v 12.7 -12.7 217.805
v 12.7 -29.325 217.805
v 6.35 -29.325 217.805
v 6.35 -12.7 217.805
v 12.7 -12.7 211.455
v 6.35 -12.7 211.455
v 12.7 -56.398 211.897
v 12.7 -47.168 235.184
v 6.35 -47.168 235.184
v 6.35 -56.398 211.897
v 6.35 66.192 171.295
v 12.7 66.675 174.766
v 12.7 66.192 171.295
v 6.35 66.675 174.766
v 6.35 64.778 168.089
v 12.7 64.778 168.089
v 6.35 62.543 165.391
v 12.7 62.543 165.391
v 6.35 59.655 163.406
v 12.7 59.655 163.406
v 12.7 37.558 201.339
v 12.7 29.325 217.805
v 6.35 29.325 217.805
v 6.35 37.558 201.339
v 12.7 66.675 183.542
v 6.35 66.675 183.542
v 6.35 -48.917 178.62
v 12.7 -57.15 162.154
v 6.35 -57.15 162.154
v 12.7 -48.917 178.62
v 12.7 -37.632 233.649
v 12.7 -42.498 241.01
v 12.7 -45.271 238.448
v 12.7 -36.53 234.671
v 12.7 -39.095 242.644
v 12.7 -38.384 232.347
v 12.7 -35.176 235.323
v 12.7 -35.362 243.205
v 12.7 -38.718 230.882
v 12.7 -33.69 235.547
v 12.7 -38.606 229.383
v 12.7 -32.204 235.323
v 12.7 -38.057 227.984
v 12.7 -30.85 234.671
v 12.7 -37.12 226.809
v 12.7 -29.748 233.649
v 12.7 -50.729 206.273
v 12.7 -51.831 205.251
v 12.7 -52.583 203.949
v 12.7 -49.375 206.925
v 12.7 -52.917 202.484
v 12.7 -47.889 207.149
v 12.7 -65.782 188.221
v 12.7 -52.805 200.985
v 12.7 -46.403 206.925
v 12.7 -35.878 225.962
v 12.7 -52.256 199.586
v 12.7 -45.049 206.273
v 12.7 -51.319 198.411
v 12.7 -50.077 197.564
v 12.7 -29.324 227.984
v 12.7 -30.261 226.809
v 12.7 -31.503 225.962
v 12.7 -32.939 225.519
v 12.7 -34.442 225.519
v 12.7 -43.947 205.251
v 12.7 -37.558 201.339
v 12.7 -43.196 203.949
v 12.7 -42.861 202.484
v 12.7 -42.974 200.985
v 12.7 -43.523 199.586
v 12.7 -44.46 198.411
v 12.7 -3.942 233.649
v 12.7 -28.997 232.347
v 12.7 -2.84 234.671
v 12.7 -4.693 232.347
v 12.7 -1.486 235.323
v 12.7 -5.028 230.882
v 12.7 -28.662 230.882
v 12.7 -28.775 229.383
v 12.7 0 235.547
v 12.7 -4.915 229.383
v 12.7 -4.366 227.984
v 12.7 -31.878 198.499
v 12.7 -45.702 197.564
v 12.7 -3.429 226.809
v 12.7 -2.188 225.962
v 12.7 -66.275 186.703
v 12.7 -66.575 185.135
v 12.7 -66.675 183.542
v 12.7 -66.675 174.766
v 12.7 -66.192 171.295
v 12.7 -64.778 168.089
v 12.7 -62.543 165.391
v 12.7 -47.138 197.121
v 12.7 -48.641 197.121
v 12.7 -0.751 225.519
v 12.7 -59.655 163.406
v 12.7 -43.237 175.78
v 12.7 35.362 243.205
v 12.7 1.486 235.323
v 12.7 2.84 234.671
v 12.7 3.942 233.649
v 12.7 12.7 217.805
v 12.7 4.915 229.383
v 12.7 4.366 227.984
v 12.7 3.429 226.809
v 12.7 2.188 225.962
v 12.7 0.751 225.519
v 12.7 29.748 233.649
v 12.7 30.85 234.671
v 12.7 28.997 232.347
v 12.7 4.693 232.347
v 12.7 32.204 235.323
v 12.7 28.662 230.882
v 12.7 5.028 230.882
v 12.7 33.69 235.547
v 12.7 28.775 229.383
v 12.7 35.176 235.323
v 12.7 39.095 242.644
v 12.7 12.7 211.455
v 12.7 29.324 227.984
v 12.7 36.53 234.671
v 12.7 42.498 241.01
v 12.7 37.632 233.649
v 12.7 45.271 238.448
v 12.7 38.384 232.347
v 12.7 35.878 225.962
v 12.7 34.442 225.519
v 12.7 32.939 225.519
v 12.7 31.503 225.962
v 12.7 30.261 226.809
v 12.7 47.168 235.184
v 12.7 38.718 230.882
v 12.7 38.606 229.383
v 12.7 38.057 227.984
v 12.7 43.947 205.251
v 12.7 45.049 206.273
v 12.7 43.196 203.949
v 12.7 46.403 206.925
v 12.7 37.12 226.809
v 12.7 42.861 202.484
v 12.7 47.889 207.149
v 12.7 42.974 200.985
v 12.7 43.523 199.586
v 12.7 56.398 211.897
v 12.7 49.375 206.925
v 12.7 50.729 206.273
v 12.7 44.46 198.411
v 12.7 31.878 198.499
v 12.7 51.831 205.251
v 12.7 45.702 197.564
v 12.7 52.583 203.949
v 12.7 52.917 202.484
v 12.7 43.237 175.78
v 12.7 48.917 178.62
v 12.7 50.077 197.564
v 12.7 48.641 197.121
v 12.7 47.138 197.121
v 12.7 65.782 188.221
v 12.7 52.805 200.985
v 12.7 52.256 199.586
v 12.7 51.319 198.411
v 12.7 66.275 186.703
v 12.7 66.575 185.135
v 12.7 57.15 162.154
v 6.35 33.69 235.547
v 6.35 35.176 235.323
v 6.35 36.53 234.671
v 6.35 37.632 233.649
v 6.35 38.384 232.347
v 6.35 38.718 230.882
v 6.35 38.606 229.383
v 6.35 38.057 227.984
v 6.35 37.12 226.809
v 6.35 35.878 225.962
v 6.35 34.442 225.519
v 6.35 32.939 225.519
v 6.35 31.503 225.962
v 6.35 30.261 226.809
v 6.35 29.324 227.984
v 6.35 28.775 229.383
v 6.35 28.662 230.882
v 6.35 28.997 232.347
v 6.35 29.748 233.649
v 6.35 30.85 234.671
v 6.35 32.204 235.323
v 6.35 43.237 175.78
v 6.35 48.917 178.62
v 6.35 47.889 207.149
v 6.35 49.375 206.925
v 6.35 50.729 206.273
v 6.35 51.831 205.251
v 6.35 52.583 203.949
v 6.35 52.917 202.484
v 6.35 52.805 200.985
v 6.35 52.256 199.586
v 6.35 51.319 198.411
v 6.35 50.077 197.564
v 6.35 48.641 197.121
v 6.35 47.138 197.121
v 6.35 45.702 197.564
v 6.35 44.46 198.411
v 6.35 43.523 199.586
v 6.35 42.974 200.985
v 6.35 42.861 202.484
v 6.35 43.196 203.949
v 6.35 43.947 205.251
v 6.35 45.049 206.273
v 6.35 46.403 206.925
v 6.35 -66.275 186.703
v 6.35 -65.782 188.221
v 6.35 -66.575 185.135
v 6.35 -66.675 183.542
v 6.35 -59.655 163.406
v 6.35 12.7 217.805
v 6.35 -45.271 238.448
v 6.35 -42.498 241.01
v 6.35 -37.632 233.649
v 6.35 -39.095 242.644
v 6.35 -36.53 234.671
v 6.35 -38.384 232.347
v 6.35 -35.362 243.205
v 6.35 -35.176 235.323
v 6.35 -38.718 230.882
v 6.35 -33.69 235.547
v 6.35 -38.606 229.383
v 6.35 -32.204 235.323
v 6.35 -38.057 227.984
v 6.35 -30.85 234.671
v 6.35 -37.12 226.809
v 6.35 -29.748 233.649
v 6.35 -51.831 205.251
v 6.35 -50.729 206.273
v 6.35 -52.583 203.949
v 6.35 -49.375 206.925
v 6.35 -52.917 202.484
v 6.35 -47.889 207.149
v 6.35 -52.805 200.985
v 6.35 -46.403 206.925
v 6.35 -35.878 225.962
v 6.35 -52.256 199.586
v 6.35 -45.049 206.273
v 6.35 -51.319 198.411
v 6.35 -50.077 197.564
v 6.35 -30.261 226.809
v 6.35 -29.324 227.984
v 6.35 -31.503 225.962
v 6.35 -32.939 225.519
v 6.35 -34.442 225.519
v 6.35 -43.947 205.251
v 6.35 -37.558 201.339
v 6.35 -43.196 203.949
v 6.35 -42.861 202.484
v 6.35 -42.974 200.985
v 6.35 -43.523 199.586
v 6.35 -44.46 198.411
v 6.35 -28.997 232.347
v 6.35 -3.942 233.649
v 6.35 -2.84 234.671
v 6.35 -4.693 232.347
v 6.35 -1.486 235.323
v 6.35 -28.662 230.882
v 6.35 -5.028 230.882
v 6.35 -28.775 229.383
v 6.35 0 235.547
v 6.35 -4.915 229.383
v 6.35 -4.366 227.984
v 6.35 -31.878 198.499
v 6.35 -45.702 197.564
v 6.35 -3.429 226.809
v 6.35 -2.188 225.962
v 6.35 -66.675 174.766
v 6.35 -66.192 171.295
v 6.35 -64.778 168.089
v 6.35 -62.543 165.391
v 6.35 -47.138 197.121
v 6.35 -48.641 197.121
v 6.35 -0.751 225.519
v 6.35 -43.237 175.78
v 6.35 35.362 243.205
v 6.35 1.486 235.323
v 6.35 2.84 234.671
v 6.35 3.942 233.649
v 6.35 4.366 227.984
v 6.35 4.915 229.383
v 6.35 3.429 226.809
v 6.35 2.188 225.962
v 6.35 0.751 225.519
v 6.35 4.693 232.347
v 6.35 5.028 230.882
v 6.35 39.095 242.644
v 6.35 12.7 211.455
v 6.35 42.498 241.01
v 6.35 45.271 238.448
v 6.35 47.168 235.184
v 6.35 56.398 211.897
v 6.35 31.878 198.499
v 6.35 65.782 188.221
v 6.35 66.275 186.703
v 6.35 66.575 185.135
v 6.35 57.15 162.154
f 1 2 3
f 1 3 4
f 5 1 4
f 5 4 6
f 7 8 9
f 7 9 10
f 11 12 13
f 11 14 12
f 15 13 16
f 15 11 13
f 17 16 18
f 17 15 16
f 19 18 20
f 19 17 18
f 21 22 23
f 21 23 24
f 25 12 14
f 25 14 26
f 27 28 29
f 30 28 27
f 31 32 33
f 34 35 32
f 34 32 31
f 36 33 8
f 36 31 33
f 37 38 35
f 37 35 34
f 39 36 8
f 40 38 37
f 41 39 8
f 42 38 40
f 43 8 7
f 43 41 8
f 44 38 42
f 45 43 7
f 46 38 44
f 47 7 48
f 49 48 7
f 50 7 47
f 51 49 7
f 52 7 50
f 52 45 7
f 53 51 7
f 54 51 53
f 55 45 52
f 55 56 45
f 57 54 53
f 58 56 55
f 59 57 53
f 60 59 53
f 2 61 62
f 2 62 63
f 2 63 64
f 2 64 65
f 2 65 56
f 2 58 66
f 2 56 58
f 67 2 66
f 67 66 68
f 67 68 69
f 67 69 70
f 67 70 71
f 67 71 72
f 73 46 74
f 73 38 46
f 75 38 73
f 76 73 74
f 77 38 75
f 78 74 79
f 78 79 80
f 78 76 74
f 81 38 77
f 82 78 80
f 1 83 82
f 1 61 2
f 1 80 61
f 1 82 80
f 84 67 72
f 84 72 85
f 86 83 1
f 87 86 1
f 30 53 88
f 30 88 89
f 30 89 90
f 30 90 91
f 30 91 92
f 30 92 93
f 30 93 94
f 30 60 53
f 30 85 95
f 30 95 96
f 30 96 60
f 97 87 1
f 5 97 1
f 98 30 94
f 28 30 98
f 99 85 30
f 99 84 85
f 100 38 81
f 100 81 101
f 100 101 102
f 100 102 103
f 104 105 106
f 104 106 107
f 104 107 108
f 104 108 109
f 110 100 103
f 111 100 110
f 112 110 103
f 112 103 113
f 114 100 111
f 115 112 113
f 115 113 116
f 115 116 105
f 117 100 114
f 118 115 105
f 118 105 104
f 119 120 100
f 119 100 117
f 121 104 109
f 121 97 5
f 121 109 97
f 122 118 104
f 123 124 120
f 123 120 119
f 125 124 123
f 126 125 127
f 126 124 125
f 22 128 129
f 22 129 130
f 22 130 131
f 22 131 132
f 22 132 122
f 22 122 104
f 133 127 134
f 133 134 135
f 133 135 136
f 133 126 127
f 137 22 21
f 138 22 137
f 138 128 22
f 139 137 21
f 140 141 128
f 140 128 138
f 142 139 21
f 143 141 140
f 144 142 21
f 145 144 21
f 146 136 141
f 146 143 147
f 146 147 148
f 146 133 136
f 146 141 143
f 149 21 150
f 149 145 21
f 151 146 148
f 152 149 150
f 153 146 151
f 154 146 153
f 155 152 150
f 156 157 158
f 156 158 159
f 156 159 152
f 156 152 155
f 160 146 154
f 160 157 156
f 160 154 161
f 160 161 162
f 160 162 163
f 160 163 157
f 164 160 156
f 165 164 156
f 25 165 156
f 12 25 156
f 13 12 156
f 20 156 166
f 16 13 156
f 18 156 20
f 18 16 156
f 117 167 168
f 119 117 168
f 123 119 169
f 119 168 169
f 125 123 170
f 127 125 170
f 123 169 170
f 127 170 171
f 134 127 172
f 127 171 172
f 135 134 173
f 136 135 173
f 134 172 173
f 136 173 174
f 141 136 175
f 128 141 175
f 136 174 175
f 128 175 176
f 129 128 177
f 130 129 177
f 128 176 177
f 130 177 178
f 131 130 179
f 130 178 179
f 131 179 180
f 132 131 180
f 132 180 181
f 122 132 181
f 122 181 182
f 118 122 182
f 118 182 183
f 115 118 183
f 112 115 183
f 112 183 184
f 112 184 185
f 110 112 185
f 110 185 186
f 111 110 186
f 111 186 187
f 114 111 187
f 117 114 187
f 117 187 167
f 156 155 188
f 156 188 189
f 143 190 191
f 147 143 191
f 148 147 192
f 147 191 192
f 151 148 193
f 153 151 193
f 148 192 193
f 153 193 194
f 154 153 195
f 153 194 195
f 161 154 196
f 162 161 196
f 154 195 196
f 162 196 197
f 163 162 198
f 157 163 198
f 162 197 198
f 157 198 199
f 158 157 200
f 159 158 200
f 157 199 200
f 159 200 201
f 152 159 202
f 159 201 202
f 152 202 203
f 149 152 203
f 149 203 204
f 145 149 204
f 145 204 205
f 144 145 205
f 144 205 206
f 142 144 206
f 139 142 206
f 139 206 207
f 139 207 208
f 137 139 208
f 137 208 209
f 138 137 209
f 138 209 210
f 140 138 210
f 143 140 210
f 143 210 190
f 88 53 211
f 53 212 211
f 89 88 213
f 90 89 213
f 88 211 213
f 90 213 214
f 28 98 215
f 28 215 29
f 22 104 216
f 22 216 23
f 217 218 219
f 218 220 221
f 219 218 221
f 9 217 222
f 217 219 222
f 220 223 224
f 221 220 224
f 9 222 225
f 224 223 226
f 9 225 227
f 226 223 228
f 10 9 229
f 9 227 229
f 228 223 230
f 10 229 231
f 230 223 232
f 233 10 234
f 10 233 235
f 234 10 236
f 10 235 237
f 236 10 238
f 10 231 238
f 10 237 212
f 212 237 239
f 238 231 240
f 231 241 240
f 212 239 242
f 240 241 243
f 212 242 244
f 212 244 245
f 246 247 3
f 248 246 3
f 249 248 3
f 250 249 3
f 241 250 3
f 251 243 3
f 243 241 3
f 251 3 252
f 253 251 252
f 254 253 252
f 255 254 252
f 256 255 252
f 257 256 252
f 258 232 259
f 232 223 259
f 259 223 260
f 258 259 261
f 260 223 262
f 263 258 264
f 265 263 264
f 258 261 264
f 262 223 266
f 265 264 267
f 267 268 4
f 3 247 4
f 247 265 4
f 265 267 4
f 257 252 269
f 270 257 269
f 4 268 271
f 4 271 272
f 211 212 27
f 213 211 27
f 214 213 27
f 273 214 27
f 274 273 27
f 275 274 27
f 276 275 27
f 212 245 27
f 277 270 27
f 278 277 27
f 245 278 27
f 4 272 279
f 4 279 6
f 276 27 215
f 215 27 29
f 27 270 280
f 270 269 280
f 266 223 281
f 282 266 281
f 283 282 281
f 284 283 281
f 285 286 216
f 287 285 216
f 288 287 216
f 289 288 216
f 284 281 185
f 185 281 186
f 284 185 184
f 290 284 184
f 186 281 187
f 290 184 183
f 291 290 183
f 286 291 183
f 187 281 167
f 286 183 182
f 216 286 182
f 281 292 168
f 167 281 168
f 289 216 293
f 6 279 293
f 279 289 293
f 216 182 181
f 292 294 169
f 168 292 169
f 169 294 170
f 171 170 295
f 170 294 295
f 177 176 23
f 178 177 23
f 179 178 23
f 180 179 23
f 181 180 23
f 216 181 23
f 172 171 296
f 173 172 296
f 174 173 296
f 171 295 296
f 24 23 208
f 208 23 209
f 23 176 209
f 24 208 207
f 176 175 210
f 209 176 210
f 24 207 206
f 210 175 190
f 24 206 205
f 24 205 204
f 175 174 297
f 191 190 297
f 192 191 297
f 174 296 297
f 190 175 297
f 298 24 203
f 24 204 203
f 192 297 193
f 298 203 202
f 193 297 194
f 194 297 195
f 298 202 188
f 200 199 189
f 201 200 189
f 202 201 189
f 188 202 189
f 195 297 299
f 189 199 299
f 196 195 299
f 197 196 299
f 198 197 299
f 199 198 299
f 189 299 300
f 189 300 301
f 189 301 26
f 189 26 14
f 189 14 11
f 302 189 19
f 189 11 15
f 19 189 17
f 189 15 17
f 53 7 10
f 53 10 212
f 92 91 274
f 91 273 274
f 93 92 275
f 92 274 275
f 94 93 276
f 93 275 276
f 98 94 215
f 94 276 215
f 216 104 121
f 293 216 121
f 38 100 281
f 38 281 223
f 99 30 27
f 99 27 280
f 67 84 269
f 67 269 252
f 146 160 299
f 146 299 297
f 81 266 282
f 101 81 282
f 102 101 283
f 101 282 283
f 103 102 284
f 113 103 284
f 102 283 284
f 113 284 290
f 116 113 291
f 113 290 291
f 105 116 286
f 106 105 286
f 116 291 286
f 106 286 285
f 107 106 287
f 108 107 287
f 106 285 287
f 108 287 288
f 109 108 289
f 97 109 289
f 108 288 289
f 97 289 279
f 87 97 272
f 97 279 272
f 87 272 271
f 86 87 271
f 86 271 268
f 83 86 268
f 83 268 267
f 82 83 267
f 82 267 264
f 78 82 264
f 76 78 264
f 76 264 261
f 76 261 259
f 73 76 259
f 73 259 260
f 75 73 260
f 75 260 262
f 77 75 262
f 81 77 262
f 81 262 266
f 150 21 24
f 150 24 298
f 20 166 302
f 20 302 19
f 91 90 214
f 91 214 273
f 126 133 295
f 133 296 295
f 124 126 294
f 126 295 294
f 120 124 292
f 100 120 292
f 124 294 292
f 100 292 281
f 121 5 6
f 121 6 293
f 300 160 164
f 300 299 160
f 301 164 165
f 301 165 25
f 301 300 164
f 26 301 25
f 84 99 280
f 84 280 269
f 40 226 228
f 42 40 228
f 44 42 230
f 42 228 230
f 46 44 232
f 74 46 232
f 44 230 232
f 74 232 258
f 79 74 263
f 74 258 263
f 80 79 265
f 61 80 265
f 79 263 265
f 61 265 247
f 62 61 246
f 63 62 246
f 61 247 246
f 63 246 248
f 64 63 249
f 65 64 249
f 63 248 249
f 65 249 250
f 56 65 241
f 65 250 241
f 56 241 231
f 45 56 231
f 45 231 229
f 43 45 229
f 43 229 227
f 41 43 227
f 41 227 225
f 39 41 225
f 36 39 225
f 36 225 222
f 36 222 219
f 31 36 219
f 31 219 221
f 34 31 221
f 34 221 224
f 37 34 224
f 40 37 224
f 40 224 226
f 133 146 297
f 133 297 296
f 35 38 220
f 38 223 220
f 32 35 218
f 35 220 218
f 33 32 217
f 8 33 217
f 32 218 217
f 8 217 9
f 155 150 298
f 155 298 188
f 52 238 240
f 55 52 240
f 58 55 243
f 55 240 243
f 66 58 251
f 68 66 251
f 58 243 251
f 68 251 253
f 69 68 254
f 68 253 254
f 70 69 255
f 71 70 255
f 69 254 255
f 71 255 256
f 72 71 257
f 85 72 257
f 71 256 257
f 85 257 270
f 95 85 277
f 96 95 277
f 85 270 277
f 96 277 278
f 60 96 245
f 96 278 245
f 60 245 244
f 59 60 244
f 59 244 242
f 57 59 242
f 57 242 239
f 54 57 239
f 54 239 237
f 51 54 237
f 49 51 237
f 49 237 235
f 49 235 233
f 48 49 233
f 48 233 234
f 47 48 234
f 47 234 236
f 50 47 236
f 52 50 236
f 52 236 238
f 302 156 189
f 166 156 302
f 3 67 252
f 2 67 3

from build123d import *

# Parameters (mm, degrees)
SKETCH1_R                   = 7.9375
SKETCH1_R_2                 = 11.1125
BOSS_EXTRUDE1_DEPTH         = 12.7
F_8_CLEARANCE_HOLE1_D       = 4.4958
SKETCH5_R                   = 18.415
CUT_EXTRUDE1_DEPTH          = 13.7
SKETCH7_R                   = 9.525
CUT_EXTRUDE2_DEPTH          = 13.7
CUT_EXTRUDE3_DEPTH          = 13.7
BOSS_EXTRUDE2_DEPTH         = 12.7
CUT_EXTRUDE4_DEPTH          = 13.7
SKETCH11_W                  = 12.7
SKETCH11_H                  = 178.054
CUT_EXTRUDE5_DEPTH          = 3.175
BOSS_EXTRUDE3_DEPTH         = 6.35
CUT_EXTRUDE6_DEPTH          = 13.7
F_3_8_CLEARANCE_HOLE1_D     = 10.0838
F_3_8_CLEARANCE_HOLE1_DEPTH = 12.7
F_3_8_CLEARANCE_HOLE1_TIP   = 3.029479155
FILLET1_R                   = 12.7
SKETCH16_W                  = 6.35
SKETCH16_H                  = 25.4
BOSS_EXTRUDE4_DEPTH         = 6.35


with BuildPart() as part:
    # Sketch1 → Boss-Extrude1 (new body)
    with BuildSketch(Plane(origin=(0, 0, 0), x_dir=(0, 0, -1), z_dir=(1, 0, 0))):
        with BuildLine():
            Line((93.345, 0), (55.245, 50.8))
            Line((55.245, 50.8), (-160.655, 50.8))
            ThreePointArc((-160.655, 50.8), (-211.455, 0), (-160.655, -50.8))
            Line((-160.655, -50.8), (55.245, -50.8))
            Line((55.245, -50.8), (93.345, 0))
        make_face()
        with Locations((-88.9, 0)):
            Circle(SKETCH1_R, mode=Mode.SUBTRACT)
        with Locations((-38.1, 0)):
            Circle(SKETCH1_R, mode=Mode.SUBTRACT)
        with Locations((-160.655, 0)):
            Circle(SKETCH1_R_2, mode=Mode.SUBTRACT)
        Circle(SKETCH1_R, mode=Mode.SUBTRACT)
    extrude(amount=BOSS_EXTRUDE1_DEPTH)

    # #8 Clearance Hole1 (through all)
    with Locations(Plane.ZY):
        with Locations((-17.691104559, 17.691104559), (17.691104559, 17.691104559), (17.691104559, -17.691104559), (-17.691104559, -17.691104559)):
            Hole(F_8_CLEARANCE_HOLE1_D / 2)

    # Sketch5 → Cut-Extrude1 (cut, through all)
    with BuildSketch(Plane.ZY):
        Circle(SKETCH5_R)
    extrude(amount=-CUT_EXTRUDE1_DEPTH, mode=Mode.SUBTRACT)

    # Sketch7 → Cut-Extrude2 (cut, through all)
    with BuildSketch(Plane.ZY):
        with Locations((-55.245, 0)):
            Circle(SKETCH7_R)
    extrude(amount=-CUT_EXTRUDE2_DEPTH, mode=Mode.SUBTRACT)

    # Sketch8 → Cut-Extrude3 (cut, through all)
    with BuildSketch(Plane(origin=(12.7, 0, 0), x_dir=(0, 0, -1), z_dir=(1, 0, 0))):
        Polygon((-160.655, 50.8), (-211.455, 25.4), (-211.455, -25.4), (-160.655, -50.8), (-233.239745749, -50.8), (-233.239745749, 50.8), align=None)
    extrude(amount=-CUT_EXTRUDE3_DEPTH, mode=Mode.SUBTRACT)

    # Sketch9 → Boss-Extrude2 (add)
    with BuildSketch(Plane(origin=(12.7, 0, 0), x_dir=(0, 0, -1), z_dir=(1, 0, 0))):
        Polygon((-160.655, 50.8), (-211.455, 25.4), (-211.455, 0), (-211.455, -25.4), (-160.655, -50.8), (-160.655, -40.64), (-202.749323348, 0), (-160.655, 40.64), align=None)
    extrude(amount=-BOSS_EXTRUDE2_DEPTH)

    # Sketch10 → Cut-Extrude4 (cut, through all)
    with BuildSketch(Plane.ZY):
        Polygon((-79.0575, -19.05), (-79.0575, 19.05), (-93.345, 0), align=None)
    extrude(amount=-CUT_EXTRUDE4_DEPTH, mode=Mode.SUBTRACT)

    # Sketch11 → Cut-Extrude5 (cut)
    with BuildSketch(Plane(origin=(0, 50.8, 0), x_dir=(1, 0, 0), z_dir=(0, 1, 0))):
        with Locations((6.35, -52.705)):
            Rectangle(SKETCH11_W, SKETCH11_H)
    cut_extrude5 = extrude(amount=-CUT_EXTRUDE5_DEPTH, mode=Mode.SUBTRACT)

    # Mirror1: Cut-Extrude5 across plane
    add(cut_extrude5.mirror(Plane.ZX), mode=Mode.SUBTRACT)

    # Sketch13 → Cut-Extrude6 (cut, through all)
    with BuildSketch(Plane(origin=(12.7, 0, 0), x_dir=(0, 0, -1), z_dir=(1, 0, 0))):
        Polygon((-161.254612663, -53.34), (-139.192, -53.34), (-139.192, -50.165), (33.782, -50.165), (33.782, -53.34), (56.515, -53.34), (81.5975, -19.896666667), (81.5975, 19.896666667), (56.515, 53.34), (33.782, 53.34), (33.782, 50.165), (-139.192, 50.165), (-139.192, 53.34), (-161.254612663, 53.34), (-213.995, 26.969806331), (-213.995, -26.969806331), align=None)
    extrude(amount=-CUT_EXTRUDE6_DEPTH, mode=Mode.SUBTRACT)


with BuildPart() as body_2:
    # Sketch12 → Boss-Extrude3 (new body)
    with BuildSketch(Plane(origin=(12.7, 0, 0), x_dir=(0, 0, -1), z_dir=(1, 0, 0))):
        with BuildLine():
            ThreePointArc((-211.89681554, -56.397839854), (-236.855, 0), (-211.89681554, 56.397839854))
            Line((-211.89681554, 56.397839854), (-243.205, 43.989212666))
            Line((-243.205, 43.989212666), (-243.205, -43.989212666))
            Line((-243.205, -43.989212666), (-211.89681554, -56.397839854))
        make_face()
        with BuildLine():
            Line((-217.805, 29.324515829), (-162.154031657, 57.15))
            Line((-162.154031657, 57.15), (-166.916531657, 66.675))
            Line((-166.916531657, 66.675), (-185.966531657, 66.675))
            Line((-185.966531657, 66.675), (-211.89681554, 56.397839854))
            ThreePointArc((-211.89681554, 56.397839854), (-236.855, 0), (-211.89681554, -56.397839854))
            Line((-211.89681554, -56.397839854), (-185.966531657, -66.675))
            Line((-185.966531657, -66.675), (-166.916531657, -66.675))
            Line((-166.916531657, -66.675), (-162.154031657, -57.15))
            Line((-162.154031657, -57.15), (-217.805, -29.324515829))
            Line((-217.805, -29.324515829), (-217.805, 29.324515829))
        make_face()
    extrude(amount=-BOSS_EXTRUDE3_DEPTH)

    # 3/8 Clearance Hole1
    with Locations(Plane(origin=(12.7, 0, 0), x_dir=(0, 0, -1), z_dir=(1, 0, 0))):
        with Locations((-230.505, 0), (-230.505, 33.690140829), (-202.106936686, 47.889172486), (-230.505, -33.690140829), (-202.106936686, -47.889172486)):
            Hole(F_3_8_CLEARANCE_HOLE1_D / 2, depth=F_3_8_CLEARANCE_HOLE1_DEPTH)
            with Locations((0, 0, -(F_3_8_CLEARANCE_HOLE1_DEPTH + F_3_8_CLEARANCE_HOLE1_TIP / 2))):  # 118° drill point
                Cone(0, F_3_8_CLEARANCE_HOLE1_D / 2, F_3_8_CLEARANCE_HOLE1_TIP, mode=Mode.SUBTRACT)

    # Fillet1
    fillet1_edges = [body_2.edges().sort_by_distance(p)[0] for p in [
        (9.525, -43.989212666, 243.205),
        (9.525, 43.989212666, 243.205),
        (9.525, 66.675, 185.966531657),
        (9.525, 66.675, 166.916531657),
        (9.525, -66.675, 166.916531657),
        (9.525, -66.675, 185.966531657),
    ]]
    fillet(fillet1_edges, radius=FILLET1_R)

    # Sketch16 → Boss-Extrude4 (add)
    with BuildSketch(Plane(origin=(12.7, 0, 0), x_dir=(0, 0, -1), z_dir=(1, 0, 0))):
        with Locations((-214.63, 0)):
            Rectangle(SKETCH16_W, SKETCH16_H)
        Polygon((-178.620290503, -48.916870577), (-175.780484171, -43.237257914), (-198.498934823, -31.878032589), (-201.338741154, -37.557645251), align=None)
        Polygon((-201.338741154, 37.557645251), (-198.498934823, 31.878032589), (-175.780484171, 43.237257914), (-178.620290503, 48.916870577), align=None)
    extrude(amount=-BOSS_EXTRUDE4_DEPTH)


solid = body_2.part
